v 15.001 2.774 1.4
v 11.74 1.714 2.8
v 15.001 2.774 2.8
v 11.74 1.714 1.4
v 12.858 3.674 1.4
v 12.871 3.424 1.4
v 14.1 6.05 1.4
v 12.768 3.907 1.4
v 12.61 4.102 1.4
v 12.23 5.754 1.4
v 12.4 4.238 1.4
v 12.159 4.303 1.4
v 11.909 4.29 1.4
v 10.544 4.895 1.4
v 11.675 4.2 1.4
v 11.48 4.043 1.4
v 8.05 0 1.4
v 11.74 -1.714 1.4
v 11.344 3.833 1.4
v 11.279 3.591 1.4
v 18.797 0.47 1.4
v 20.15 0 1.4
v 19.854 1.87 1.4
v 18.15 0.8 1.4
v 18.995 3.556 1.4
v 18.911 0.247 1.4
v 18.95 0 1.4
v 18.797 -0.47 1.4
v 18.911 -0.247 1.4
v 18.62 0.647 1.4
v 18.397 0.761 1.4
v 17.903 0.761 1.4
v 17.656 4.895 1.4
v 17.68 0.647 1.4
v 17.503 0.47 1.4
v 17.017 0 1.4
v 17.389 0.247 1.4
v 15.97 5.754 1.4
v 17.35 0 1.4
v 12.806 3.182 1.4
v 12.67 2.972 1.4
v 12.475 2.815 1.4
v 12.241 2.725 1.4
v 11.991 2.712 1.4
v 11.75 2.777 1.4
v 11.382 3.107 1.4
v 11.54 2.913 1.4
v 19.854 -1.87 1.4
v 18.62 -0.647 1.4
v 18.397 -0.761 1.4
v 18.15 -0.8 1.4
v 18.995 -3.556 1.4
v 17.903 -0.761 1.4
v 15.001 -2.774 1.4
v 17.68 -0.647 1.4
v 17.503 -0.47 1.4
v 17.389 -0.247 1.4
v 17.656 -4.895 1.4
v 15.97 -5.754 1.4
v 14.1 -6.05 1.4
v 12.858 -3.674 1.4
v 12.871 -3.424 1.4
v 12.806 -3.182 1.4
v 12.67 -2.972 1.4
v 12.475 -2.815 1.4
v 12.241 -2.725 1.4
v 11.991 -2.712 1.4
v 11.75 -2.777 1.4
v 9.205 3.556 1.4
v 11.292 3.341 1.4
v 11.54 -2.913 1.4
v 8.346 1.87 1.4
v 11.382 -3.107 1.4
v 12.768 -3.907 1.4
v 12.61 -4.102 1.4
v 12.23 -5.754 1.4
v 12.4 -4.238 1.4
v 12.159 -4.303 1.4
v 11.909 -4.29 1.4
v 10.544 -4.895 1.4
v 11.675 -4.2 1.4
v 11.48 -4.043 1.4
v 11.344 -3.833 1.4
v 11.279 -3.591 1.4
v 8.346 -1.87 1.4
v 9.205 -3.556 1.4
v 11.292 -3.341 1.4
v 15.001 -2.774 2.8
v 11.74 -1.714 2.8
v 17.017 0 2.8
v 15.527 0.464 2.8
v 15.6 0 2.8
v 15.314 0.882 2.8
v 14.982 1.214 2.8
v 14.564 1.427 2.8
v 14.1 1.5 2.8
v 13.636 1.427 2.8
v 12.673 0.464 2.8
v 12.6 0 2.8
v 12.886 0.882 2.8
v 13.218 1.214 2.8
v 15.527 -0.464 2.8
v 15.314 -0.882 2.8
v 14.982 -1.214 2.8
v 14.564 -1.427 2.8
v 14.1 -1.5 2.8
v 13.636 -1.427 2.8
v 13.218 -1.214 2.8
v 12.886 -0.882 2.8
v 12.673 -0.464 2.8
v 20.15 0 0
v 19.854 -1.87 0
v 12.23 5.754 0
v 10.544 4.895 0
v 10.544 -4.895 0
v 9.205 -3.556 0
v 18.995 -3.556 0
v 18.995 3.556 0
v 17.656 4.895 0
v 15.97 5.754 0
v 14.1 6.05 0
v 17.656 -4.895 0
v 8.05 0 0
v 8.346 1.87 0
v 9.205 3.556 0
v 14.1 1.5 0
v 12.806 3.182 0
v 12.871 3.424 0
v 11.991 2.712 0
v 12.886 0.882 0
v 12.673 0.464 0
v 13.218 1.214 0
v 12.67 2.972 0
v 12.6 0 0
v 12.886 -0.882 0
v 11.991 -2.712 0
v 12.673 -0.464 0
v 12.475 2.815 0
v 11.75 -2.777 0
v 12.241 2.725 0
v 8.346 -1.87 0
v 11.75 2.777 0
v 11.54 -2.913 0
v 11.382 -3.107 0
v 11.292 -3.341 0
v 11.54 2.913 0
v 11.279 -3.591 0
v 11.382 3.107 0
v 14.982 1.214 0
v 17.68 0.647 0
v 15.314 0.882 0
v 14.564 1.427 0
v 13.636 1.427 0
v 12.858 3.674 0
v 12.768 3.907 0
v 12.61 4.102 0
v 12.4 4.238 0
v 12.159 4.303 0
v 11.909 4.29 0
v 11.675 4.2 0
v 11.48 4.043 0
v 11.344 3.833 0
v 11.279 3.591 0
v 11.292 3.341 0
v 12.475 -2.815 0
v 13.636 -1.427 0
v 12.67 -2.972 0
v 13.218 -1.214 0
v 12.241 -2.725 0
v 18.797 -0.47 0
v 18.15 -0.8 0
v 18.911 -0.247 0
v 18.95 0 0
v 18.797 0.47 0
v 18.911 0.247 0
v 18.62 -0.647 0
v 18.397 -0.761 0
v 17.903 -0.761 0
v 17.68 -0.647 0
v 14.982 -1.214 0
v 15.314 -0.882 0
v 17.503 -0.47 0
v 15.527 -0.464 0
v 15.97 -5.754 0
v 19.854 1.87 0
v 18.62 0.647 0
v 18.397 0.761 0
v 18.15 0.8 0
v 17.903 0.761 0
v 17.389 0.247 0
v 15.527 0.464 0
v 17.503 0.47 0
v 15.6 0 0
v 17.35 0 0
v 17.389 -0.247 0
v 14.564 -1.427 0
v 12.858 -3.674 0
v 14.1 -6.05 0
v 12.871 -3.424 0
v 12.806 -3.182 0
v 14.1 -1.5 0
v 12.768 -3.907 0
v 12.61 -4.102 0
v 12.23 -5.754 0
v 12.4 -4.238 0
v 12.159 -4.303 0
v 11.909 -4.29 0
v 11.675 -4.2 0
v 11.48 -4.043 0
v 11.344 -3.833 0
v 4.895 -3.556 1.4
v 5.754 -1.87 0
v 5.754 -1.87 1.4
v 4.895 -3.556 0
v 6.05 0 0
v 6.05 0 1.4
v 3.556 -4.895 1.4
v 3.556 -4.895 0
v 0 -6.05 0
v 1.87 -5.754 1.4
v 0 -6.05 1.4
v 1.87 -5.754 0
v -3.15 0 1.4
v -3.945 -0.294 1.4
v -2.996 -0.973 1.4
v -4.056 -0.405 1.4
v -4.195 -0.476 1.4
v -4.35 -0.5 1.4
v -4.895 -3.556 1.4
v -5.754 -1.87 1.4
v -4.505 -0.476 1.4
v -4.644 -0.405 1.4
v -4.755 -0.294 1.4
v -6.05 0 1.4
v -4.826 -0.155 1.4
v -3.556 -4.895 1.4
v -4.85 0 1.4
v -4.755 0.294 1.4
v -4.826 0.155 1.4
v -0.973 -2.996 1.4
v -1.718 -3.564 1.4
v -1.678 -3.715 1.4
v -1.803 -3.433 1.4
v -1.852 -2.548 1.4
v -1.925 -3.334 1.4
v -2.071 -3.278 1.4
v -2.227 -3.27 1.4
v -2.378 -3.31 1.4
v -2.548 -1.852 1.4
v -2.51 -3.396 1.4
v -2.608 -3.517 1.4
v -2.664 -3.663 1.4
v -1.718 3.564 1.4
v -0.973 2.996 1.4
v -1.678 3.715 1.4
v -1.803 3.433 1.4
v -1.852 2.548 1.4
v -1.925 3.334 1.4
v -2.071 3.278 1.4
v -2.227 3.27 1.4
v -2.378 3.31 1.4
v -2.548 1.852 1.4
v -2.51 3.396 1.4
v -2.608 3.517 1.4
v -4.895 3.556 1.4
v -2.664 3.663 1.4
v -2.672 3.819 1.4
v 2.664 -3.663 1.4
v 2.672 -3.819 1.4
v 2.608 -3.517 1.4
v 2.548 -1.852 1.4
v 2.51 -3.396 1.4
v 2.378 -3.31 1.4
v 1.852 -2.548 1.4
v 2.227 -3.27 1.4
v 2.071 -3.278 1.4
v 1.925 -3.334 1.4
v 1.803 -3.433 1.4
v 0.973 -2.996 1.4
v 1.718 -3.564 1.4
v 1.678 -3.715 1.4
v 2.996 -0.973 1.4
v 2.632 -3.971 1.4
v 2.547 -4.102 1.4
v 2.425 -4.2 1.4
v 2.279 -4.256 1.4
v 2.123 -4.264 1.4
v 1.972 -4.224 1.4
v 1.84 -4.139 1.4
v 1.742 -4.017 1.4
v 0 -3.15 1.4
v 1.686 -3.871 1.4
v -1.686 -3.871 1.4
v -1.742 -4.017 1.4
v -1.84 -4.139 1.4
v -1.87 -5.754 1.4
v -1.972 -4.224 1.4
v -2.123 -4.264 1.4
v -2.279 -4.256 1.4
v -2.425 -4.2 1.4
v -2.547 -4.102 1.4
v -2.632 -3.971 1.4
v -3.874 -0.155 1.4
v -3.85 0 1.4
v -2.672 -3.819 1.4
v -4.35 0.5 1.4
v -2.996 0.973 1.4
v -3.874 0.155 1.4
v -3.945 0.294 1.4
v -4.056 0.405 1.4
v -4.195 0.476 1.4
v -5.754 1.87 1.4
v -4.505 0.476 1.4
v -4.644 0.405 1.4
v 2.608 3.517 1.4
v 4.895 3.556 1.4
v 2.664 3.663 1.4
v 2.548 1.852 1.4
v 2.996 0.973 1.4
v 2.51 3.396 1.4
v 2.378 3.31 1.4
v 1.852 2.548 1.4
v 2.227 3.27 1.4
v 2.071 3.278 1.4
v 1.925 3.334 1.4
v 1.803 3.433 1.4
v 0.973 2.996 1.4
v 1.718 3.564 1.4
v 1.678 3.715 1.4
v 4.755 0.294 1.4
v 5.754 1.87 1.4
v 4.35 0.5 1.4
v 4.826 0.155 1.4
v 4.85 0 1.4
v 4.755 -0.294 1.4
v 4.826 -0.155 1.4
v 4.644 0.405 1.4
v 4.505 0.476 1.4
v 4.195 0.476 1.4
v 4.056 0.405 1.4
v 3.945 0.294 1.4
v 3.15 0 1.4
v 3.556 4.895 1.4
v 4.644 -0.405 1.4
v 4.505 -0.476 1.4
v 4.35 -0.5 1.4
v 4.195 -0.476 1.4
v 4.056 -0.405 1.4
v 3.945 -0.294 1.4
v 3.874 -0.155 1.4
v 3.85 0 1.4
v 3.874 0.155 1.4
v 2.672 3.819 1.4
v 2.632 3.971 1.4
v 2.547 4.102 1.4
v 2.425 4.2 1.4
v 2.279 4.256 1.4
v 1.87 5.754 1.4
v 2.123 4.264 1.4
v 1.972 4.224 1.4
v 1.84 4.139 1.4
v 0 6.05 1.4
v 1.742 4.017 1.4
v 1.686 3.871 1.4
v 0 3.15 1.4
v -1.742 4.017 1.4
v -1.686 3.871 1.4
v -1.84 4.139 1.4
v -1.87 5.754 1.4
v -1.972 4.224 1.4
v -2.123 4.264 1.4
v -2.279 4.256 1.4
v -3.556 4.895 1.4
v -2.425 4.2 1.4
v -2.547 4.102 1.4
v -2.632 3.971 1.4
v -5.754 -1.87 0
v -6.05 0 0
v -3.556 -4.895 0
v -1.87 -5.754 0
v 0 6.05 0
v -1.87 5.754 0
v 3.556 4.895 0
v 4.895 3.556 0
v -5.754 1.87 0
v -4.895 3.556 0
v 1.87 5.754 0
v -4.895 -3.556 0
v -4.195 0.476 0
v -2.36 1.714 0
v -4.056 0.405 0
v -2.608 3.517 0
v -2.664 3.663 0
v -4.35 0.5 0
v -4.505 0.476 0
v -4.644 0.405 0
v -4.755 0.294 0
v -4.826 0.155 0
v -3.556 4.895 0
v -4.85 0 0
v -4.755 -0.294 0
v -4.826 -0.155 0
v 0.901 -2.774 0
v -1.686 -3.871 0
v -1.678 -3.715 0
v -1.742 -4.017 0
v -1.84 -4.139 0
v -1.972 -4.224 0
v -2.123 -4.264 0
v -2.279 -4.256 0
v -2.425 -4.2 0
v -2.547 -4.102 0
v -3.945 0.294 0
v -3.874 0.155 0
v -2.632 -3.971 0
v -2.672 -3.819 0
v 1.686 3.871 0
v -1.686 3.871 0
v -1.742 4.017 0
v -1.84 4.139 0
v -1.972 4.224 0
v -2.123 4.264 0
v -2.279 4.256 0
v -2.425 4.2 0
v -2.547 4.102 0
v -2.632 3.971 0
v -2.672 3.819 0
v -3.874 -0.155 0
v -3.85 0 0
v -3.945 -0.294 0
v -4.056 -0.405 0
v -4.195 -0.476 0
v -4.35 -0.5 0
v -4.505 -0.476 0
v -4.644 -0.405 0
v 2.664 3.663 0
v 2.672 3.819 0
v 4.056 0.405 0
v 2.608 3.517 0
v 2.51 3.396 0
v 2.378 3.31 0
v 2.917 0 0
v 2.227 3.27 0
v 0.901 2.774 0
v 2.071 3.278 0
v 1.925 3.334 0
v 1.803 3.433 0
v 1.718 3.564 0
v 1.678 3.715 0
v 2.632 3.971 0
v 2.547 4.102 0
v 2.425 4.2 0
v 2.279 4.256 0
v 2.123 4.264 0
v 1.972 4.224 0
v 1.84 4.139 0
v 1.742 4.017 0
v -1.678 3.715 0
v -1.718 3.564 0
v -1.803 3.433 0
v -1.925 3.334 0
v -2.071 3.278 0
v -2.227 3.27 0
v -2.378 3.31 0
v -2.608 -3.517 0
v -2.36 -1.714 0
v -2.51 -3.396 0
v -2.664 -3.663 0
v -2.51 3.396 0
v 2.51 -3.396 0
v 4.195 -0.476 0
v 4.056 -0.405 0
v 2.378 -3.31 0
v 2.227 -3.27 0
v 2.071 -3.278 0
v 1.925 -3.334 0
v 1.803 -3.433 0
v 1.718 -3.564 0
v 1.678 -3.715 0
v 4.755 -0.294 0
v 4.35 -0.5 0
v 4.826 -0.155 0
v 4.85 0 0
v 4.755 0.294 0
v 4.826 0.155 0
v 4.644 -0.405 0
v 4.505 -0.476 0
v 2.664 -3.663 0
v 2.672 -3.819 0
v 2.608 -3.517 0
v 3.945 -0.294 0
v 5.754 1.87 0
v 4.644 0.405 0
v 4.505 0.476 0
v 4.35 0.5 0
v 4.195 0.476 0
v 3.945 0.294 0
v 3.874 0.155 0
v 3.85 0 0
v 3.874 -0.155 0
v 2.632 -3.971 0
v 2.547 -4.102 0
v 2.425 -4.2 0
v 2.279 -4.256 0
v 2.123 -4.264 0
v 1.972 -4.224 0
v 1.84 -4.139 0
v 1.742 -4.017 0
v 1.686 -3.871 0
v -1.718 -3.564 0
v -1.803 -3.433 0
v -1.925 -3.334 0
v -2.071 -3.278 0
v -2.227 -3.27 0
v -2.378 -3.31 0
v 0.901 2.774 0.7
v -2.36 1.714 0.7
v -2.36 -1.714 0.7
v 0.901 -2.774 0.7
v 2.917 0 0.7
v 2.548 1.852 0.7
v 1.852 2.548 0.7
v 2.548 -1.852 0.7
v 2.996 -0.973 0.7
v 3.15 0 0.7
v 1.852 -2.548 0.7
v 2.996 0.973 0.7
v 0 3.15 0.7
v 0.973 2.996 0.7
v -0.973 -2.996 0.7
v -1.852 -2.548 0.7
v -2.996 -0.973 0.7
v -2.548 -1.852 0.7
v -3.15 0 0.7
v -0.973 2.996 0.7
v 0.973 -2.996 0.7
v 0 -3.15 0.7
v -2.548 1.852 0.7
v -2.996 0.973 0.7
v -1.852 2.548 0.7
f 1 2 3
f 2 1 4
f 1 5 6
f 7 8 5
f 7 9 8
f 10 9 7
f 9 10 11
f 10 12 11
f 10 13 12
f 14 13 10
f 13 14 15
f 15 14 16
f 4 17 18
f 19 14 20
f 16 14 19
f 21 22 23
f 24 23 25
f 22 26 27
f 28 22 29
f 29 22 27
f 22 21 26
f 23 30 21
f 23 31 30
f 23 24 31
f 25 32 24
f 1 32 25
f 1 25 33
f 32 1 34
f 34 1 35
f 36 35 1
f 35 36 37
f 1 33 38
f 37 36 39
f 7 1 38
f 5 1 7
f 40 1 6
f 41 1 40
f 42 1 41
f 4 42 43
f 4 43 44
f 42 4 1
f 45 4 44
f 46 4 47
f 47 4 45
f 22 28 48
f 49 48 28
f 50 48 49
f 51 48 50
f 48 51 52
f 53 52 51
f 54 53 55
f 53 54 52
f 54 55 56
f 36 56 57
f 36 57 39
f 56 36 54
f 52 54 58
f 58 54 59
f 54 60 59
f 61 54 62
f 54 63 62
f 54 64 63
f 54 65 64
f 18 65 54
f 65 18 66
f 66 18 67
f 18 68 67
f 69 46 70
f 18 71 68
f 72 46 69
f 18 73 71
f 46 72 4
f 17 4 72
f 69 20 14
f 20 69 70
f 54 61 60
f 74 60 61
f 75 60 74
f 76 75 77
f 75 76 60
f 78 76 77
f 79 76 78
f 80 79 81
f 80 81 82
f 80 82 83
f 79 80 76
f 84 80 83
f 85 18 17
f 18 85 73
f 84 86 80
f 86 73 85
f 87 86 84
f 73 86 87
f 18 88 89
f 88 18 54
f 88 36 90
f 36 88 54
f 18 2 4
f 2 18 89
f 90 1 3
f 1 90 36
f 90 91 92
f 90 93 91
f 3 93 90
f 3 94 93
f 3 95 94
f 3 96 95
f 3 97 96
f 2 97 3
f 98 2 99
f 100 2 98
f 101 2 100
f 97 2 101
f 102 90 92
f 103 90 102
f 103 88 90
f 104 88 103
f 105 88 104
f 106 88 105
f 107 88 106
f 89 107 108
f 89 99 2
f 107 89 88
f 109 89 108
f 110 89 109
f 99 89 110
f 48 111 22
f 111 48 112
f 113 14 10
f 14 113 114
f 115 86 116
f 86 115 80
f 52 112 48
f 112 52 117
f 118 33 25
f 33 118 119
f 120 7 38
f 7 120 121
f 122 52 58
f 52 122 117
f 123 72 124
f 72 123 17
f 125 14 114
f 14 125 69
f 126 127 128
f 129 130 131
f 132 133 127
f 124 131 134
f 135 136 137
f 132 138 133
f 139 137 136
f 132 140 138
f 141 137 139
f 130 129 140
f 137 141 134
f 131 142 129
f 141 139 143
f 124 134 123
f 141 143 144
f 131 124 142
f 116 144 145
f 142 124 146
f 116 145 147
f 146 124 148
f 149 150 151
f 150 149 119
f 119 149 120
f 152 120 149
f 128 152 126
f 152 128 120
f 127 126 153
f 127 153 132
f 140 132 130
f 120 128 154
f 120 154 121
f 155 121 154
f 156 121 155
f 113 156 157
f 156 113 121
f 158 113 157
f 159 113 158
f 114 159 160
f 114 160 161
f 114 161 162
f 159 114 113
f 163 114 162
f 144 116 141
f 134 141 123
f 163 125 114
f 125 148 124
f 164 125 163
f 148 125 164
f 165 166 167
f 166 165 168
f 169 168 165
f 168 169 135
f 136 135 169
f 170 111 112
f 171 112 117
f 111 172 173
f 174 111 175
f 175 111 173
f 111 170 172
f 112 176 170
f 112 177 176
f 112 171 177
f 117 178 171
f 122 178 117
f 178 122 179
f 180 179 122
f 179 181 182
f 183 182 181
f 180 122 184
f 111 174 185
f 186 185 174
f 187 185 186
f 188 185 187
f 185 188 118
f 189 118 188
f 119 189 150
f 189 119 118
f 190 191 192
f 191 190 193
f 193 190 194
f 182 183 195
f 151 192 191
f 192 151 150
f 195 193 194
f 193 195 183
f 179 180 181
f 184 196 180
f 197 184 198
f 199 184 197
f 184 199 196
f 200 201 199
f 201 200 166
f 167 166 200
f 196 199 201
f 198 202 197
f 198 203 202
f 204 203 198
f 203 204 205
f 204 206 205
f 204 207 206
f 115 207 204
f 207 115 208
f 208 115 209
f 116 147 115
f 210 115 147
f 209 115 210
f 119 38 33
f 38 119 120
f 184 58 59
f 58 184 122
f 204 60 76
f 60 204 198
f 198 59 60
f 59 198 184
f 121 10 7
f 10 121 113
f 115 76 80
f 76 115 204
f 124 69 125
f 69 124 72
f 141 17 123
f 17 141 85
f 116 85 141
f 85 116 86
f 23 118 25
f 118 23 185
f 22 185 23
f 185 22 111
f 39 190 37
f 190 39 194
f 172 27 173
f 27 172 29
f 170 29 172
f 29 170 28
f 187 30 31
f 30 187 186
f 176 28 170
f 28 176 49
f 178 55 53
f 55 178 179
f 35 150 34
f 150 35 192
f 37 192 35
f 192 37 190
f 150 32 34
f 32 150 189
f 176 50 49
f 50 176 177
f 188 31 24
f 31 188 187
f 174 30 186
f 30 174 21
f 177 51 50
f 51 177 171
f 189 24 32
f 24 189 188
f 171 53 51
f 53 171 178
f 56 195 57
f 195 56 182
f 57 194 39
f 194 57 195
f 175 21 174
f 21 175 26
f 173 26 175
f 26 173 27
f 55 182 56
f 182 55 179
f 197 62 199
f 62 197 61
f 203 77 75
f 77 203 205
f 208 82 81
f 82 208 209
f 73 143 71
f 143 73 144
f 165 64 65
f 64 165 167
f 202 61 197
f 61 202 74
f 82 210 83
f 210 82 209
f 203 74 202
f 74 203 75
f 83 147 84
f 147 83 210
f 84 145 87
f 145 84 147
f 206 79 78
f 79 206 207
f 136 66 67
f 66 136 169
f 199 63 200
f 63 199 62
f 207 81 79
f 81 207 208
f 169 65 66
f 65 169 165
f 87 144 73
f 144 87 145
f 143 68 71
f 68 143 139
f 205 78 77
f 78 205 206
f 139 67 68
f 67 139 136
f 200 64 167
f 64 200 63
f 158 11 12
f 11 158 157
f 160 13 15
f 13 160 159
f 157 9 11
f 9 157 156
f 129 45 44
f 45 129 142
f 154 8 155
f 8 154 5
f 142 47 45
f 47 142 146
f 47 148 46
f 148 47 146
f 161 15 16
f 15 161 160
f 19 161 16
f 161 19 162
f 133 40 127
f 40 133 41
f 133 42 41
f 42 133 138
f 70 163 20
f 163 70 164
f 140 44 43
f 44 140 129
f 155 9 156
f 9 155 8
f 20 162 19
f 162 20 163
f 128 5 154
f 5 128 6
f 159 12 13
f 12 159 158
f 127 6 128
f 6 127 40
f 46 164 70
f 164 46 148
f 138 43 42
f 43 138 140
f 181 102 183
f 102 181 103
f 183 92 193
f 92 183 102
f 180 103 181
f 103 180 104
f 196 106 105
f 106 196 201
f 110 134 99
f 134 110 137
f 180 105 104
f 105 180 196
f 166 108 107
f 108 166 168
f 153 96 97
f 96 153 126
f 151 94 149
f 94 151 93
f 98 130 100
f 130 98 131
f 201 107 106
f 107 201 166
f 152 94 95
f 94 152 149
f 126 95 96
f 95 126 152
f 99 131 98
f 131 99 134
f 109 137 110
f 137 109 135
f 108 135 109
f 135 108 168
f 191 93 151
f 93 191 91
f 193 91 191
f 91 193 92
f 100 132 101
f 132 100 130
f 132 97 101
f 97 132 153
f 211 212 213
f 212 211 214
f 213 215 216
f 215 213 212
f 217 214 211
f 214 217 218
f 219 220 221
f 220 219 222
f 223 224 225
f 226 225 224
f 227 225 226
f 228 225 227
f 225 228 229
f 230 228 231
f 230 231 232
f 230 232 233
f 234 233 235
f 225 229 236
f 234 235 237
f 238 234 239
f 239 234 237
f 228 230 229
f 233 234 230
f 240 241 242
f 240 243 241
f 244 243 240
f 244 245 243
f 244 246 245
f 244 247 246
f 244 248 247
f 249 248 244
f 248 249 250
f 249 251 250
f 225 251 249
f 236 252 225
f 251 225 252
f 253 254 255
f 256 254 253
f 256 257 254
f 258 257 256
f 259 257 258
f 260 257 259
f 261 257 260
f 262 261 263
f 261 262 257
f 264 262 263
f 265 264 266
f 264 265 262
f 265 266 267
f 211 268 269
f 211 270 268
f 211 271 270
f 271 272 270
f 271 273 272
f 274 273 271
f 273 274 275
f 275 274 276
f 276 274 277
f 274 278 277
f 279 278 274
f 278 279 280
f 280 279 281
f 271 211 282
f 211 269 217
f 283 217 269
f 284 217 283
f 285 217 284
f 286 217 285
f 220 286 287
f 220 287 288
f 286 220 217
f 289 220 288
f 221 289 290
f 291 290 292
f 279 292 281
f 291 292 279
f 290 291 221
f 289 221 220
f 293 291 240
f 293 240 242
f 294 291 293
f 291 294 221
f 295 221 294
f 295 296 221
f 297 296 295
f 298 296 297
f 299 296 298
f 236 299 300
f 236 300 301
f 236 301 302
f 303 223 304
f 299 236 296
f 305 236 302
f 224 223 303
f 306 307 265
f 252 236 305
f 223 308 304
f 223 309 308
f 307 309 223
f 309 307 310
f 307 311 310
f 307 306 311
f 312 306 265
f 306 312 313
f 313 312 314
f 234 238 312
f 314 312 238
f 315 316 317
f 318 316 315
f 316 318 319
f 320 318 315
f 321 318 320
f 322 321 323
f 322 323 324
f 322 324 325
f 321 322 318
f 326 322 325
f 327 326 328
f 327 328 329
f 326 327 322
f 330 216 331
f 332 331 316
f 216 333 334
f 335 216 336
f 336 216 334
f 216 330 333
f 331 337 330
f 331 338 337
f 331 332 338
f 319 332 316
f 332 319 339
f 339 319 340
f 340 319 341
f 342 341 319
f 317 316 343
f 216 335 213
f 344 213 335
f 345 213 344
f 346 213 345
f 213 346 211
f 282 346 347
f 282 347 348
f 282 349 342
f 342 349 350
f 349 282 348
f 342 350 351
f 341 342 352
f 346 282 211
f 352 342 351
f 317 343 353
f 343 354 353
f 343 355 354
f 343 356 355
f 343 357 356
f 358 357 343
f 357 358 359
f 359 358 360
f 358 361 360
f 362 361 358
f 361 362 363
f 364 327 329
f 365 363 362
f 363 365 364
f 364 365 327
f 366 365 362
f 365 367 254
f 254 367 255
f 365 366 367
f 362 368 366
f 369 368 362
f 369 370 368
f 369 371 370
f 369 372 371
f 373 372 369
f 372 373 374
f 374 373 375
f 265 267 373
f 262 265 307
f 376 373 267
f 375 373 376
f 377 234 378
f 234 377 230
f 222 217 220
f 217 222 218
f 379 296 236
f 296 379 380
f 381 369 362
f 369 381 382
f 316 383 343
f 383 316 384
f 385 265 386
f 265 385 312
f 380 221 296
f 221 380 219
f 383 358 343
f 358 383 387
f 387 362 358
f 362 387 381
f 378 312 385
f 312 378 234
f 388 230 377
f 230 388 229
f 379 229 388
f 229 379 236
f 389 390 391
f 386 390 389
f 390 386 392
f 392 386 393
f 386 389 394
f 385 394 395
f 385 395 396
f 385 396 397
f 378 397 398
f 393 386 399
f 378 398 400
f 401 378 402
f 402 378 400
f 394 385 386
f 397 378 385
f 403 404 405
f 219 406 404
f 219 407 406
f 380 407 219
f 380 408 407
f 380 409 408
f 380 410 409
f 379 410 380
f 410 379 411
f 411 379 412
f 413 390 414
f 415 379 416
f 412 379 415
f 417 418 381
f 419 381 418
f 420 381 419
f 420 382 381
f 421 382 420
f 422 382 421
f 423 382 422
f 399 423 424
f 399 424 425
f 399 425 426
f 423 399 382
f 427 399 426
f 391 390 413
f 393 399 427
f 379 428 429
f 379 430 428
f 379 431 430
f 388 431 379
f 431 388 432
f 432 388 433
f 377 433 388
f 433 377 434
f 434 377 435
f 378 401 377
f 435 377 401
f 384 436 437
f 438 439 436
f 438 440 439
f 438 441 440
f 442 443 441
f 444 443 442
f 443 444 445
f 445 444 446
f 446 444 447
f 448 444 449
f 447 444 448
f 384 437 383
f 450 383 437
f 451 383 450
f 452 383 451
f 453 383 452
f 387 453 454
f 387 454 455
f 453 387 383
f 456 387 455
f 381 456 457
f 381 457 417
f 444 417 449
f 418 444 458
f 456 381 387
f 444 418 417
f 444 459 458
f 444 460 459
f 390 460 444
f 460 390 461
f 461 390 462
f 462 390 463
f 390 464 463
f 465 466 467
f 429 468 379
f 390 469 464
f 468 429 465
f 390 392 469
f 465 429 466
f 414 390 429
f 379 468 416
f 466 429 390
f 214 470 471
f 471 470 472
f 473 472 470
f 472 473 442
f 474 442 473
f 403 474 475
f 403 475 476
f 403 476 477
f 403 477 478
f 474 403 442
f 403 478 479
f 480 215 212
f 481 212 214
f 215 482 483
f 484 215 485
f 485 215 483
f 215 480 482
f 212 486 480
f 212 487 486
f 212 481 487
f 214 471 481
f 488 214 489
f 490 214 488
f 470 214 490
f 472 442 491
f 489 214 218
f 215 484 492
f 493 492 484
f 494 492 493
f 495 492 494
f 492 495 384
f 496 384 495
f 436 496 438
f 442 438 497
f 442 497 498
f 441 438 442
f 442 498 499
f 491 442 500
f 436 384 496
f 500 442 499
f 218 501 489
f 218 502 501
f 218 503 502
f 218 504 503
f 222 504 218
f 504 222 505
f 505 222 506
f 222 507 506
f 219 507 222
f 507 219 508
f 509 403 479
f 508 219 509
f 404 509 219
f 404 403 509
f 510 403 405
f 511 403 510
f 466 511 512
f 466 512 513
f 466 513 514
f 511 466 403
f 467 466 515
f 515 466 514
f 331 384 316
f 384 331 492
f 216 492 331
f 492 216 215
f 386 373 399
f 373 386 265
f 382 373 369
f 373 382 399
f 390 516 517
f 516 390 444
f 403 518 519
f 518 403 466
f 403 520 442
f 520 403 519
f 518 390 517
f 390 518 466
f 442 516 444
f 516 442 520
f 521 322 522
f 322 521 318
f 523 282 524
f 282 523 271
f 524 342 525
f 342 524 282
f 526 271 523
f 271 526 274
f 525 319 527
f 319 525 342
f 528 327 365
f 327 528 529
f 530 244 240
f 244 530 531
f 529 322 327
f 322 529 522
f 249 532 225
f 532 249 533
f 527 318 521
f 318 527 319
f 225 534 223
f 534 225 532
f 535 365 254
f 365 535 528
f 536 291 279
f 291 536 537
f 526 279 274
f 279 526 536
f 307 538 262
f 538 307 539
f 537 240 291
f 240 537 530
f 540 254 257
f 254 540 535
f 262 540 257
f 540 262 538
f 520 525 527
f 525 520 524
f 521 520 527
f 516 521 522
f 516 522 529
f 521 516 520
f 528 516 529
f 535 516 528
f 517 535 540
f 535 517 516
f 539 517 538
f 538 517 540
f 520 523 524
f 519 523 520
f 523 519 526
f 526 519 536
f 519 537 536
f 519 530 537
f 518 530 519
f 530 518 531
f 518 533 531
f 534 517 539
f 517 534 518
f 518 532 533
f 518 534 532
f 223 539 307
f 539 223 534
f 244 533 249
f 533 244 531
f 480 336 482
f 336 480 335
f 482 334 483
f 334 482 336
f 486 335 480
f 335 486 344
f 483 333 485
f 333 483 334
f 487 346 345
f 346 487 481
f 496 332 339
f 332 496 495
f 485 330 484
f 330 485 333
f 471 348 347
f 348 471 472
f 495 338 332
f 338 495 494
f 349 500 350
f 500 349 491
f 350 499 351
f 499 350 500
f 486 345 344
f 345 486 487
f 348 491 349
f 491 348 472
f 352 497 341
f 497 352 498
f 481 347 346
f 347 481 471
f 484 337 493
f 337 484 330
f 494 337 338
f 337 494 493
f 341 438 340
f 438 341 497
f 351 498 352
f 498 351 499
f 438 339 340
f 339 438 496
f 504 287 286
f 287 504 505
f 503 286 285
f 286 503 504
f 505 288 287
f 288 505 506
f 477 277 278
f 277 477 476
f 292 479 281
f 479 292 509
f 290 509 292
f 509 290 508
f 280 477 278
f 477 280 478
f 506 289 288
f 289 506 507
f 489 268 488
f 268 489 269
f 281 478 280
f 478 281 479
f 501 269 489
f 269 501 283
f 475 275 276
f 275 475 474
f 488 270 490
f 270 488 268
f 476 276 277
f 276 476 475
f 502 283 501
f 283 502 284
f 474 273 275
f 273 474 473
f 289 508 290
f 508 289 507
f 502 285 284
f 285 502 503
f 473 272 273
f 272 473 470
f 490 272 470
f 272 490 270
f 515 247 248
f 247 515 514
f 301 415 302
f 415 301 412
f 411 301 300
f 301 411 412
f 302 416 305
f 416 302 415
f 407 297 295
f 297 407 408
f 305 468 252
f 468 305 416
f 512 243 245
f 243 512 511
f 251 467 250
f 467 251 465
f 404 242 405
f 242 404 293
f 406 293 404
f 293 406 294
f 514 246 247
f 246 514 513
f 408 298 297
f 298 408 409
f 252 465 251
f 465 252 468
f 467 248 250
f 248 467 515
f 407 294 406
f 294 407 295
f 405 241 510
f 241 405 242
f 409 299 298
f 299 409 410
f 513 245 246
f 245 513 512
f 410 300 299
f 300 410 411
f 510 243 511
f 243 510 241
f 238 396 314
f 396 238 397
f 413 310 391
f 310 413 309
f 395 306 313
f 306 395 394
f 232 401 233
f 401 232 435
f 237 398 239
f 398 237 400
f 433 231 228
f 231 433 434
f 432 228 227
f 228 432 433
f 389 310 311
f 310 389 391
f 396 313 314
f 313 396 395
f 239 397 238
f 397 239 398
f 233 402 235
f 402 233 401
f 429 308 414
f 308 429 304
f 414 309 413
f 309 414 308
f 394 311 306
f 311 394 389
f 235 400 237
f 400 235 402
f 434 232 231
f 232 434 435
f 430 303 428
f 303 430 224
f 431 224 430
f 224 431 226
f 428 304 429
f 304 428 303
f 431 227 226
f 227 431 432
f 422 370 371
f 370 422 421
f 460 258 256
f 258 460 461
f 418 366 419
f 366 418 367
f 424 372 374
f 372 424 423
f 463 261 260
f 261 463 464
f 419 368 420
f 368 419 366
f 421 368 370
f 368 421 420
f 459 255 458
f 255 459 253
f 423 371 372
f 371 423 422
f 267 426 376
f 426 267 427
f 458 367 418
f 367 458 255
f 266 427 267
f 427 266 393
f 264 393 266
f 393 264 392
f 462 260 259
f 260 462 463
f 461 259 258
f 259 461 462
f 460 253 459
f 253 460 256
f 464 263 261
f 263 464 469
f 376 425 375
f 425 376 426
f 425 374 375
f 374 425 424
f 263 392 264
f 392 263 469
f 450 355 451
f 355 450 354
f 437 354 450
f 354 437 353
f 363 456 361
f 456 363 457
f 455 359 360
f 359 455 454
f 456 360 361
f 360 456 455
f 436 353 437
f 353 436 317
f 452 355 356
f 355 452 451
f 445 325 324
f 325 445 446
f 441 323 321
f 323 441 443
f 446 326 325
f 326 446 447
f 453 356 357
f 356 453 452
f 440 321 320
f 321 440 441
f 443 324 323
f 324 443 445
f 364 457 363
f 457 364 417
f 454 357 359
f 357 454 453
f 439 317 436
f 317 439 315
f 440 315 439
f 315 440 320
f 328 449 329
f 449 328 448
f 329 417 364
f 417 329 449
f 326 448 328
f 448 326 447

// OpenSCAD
shaft_diameter = 3.0;
cylinder_diameter = 12.1;  //12.1 xray
hole_edge_distance = 1.2;  //12mm borelle 1.2?
clip_inbetween_height = 2.8; //schumi

//TODO: opening gap as parameter

clip_diameter = 6.1; //schumi 6.1
clip_thickness = 0.3; //schumi 0.3
bottom_height = 0.6;
num_upper_holes = 3;
num_lower_holes = 6;
upper_hole_diameter = 1.6;
lower_hole_diameter = 1.0;

disc_height = clip_inbetween_height /2;  //empirical: schumin clippiväliin 1.5
lock_inner_scaledown = 0.95;
lock_width = shaft_diameter + (cylinder_diameter/3 - hole_edge_distance);
lock_length = shaft_diameter + 1.2;
lock_height = disc_height;


top_clip_recess_radius = clip_diameter/2 + 0.1;

//mismatches all holes
//would require disc sides to pass some oil
//try $fn=8 -> 12
//hole_offset_degrees = 360/num_upper_holes/2;
hole_offset_degrees = 0;

render_disc_distance = 0;

$vpr = [70, 0, $t * 360];

$fn=20;

//male lock shape from adding lock (scaled down to fit the female shape)
module upper_disc() {
  translate ([0,0, - disc_height/2]) 
  scale([lock_inner_scaledown]) lock();
  base_disc(); 
}

//female lock shape from difference
module lower_disc() {
  difference() {
    base_disc();
    translate ([0,0, + lock_height/2 + bottom_height]) lock();
    translate ([0,0,0]) lock();
    translate ([0,0,-0.1]) cylinder(disc_height - bottom_height, top_clip_recess_radius, top_clip_recess_radius);
  } 
}

//shape used to lock the disc rotation
module lock() {
    //basic rectangular shape
    //cube([lock_length, lock_width, lock_height], true);
    
    //n-sided cylinder
    cylinder($fn=5, r1= lock_width/2, r2=lock_width/2, h=lock_height, center=true);
}

module holed_upper_disc() {
    difference() {
        upper_disc();
        upper_holes();
        //lower_holes();
        shaft();
    }
}

module holed_lower_disc() {
    difference() {
        lower_disc();
        lower_holes();
        //shaft();;
    }
}

module upper_holes() {
    holes(hole_offset_degrees, num_upper_holes, upper_hole_diameter);
}

module lower_holes() {
    holes(0, num_lower_holes, lower_hole_diameter);
}


module base_disc() {
    color("DimGray", 0.8) cylinder(disc_height,cylinder_diameter/2,cylinder_diameter/2);
}

module holes(offset=0, num_of_holes=3, dia=1) {
    for ( i = [0:num_of_holes+1] ) {
		       	rotate( i*360/num_of_holes + offset, [0, 0, 1])		
				translate([cylinder_diameter/2 - dia/2 - hole_edge_distance, 0, 0]) cylinder(h=100, r=dia/2, center=true);}
}

//used primarily for shaft hole punching
module shaft() {
    translate ([0,0,-40 + disc_height + clip_thickness]) color("DarkGoldenrod", 1) cylinder(40, shaft_diameter/2, shaft_diameter/2);
}





//Actual drawing calls
module draw_demo() {
    rotate([180,0,0]) translate([0,0, - (disc_height - bottom_height)]) holed_lower_disc();


    translate([0,0, - clip_inbetween_height/2 + clip_thickness/2])
    rotate([180,0,0]) holed_upper_disc();     
    translate([0,0, -1]) shaft();
    //translate([0,0, - bottom_height + clip_thickness/2])

    translate([0,0, + clip_thickness/2])
    draw_clip(); //upper
    translate([0,0, - clip_inbetween_height - clip_thickness/2]) draw_clip(); //lower
}       

module draw_clip() {
    difference() {
       color("Black", 0.8) cylinder(clip_thickness, clip_diameter/2*0.9, clip_diameter/2*0.9);
    }
}

module draw_animation() {
        
    holed_upper_disc();
 
    translate([0,0, - 7 + $t]) 
        holed_lower_disc();
    }

module draw_print(num_of_pairs=1) {
//       for ( i = [0:num_of_pairs+1] ) {
           translate([cylinder_diameter + 2, 0,disc_height]) rotate([180,0,0]) holed_upper_disc();
           translate([0, 0,disc_height]) rotate([180,0,0]) holed_lower_disc();
  //     }
}

draw_print();  
//draw_demo();
